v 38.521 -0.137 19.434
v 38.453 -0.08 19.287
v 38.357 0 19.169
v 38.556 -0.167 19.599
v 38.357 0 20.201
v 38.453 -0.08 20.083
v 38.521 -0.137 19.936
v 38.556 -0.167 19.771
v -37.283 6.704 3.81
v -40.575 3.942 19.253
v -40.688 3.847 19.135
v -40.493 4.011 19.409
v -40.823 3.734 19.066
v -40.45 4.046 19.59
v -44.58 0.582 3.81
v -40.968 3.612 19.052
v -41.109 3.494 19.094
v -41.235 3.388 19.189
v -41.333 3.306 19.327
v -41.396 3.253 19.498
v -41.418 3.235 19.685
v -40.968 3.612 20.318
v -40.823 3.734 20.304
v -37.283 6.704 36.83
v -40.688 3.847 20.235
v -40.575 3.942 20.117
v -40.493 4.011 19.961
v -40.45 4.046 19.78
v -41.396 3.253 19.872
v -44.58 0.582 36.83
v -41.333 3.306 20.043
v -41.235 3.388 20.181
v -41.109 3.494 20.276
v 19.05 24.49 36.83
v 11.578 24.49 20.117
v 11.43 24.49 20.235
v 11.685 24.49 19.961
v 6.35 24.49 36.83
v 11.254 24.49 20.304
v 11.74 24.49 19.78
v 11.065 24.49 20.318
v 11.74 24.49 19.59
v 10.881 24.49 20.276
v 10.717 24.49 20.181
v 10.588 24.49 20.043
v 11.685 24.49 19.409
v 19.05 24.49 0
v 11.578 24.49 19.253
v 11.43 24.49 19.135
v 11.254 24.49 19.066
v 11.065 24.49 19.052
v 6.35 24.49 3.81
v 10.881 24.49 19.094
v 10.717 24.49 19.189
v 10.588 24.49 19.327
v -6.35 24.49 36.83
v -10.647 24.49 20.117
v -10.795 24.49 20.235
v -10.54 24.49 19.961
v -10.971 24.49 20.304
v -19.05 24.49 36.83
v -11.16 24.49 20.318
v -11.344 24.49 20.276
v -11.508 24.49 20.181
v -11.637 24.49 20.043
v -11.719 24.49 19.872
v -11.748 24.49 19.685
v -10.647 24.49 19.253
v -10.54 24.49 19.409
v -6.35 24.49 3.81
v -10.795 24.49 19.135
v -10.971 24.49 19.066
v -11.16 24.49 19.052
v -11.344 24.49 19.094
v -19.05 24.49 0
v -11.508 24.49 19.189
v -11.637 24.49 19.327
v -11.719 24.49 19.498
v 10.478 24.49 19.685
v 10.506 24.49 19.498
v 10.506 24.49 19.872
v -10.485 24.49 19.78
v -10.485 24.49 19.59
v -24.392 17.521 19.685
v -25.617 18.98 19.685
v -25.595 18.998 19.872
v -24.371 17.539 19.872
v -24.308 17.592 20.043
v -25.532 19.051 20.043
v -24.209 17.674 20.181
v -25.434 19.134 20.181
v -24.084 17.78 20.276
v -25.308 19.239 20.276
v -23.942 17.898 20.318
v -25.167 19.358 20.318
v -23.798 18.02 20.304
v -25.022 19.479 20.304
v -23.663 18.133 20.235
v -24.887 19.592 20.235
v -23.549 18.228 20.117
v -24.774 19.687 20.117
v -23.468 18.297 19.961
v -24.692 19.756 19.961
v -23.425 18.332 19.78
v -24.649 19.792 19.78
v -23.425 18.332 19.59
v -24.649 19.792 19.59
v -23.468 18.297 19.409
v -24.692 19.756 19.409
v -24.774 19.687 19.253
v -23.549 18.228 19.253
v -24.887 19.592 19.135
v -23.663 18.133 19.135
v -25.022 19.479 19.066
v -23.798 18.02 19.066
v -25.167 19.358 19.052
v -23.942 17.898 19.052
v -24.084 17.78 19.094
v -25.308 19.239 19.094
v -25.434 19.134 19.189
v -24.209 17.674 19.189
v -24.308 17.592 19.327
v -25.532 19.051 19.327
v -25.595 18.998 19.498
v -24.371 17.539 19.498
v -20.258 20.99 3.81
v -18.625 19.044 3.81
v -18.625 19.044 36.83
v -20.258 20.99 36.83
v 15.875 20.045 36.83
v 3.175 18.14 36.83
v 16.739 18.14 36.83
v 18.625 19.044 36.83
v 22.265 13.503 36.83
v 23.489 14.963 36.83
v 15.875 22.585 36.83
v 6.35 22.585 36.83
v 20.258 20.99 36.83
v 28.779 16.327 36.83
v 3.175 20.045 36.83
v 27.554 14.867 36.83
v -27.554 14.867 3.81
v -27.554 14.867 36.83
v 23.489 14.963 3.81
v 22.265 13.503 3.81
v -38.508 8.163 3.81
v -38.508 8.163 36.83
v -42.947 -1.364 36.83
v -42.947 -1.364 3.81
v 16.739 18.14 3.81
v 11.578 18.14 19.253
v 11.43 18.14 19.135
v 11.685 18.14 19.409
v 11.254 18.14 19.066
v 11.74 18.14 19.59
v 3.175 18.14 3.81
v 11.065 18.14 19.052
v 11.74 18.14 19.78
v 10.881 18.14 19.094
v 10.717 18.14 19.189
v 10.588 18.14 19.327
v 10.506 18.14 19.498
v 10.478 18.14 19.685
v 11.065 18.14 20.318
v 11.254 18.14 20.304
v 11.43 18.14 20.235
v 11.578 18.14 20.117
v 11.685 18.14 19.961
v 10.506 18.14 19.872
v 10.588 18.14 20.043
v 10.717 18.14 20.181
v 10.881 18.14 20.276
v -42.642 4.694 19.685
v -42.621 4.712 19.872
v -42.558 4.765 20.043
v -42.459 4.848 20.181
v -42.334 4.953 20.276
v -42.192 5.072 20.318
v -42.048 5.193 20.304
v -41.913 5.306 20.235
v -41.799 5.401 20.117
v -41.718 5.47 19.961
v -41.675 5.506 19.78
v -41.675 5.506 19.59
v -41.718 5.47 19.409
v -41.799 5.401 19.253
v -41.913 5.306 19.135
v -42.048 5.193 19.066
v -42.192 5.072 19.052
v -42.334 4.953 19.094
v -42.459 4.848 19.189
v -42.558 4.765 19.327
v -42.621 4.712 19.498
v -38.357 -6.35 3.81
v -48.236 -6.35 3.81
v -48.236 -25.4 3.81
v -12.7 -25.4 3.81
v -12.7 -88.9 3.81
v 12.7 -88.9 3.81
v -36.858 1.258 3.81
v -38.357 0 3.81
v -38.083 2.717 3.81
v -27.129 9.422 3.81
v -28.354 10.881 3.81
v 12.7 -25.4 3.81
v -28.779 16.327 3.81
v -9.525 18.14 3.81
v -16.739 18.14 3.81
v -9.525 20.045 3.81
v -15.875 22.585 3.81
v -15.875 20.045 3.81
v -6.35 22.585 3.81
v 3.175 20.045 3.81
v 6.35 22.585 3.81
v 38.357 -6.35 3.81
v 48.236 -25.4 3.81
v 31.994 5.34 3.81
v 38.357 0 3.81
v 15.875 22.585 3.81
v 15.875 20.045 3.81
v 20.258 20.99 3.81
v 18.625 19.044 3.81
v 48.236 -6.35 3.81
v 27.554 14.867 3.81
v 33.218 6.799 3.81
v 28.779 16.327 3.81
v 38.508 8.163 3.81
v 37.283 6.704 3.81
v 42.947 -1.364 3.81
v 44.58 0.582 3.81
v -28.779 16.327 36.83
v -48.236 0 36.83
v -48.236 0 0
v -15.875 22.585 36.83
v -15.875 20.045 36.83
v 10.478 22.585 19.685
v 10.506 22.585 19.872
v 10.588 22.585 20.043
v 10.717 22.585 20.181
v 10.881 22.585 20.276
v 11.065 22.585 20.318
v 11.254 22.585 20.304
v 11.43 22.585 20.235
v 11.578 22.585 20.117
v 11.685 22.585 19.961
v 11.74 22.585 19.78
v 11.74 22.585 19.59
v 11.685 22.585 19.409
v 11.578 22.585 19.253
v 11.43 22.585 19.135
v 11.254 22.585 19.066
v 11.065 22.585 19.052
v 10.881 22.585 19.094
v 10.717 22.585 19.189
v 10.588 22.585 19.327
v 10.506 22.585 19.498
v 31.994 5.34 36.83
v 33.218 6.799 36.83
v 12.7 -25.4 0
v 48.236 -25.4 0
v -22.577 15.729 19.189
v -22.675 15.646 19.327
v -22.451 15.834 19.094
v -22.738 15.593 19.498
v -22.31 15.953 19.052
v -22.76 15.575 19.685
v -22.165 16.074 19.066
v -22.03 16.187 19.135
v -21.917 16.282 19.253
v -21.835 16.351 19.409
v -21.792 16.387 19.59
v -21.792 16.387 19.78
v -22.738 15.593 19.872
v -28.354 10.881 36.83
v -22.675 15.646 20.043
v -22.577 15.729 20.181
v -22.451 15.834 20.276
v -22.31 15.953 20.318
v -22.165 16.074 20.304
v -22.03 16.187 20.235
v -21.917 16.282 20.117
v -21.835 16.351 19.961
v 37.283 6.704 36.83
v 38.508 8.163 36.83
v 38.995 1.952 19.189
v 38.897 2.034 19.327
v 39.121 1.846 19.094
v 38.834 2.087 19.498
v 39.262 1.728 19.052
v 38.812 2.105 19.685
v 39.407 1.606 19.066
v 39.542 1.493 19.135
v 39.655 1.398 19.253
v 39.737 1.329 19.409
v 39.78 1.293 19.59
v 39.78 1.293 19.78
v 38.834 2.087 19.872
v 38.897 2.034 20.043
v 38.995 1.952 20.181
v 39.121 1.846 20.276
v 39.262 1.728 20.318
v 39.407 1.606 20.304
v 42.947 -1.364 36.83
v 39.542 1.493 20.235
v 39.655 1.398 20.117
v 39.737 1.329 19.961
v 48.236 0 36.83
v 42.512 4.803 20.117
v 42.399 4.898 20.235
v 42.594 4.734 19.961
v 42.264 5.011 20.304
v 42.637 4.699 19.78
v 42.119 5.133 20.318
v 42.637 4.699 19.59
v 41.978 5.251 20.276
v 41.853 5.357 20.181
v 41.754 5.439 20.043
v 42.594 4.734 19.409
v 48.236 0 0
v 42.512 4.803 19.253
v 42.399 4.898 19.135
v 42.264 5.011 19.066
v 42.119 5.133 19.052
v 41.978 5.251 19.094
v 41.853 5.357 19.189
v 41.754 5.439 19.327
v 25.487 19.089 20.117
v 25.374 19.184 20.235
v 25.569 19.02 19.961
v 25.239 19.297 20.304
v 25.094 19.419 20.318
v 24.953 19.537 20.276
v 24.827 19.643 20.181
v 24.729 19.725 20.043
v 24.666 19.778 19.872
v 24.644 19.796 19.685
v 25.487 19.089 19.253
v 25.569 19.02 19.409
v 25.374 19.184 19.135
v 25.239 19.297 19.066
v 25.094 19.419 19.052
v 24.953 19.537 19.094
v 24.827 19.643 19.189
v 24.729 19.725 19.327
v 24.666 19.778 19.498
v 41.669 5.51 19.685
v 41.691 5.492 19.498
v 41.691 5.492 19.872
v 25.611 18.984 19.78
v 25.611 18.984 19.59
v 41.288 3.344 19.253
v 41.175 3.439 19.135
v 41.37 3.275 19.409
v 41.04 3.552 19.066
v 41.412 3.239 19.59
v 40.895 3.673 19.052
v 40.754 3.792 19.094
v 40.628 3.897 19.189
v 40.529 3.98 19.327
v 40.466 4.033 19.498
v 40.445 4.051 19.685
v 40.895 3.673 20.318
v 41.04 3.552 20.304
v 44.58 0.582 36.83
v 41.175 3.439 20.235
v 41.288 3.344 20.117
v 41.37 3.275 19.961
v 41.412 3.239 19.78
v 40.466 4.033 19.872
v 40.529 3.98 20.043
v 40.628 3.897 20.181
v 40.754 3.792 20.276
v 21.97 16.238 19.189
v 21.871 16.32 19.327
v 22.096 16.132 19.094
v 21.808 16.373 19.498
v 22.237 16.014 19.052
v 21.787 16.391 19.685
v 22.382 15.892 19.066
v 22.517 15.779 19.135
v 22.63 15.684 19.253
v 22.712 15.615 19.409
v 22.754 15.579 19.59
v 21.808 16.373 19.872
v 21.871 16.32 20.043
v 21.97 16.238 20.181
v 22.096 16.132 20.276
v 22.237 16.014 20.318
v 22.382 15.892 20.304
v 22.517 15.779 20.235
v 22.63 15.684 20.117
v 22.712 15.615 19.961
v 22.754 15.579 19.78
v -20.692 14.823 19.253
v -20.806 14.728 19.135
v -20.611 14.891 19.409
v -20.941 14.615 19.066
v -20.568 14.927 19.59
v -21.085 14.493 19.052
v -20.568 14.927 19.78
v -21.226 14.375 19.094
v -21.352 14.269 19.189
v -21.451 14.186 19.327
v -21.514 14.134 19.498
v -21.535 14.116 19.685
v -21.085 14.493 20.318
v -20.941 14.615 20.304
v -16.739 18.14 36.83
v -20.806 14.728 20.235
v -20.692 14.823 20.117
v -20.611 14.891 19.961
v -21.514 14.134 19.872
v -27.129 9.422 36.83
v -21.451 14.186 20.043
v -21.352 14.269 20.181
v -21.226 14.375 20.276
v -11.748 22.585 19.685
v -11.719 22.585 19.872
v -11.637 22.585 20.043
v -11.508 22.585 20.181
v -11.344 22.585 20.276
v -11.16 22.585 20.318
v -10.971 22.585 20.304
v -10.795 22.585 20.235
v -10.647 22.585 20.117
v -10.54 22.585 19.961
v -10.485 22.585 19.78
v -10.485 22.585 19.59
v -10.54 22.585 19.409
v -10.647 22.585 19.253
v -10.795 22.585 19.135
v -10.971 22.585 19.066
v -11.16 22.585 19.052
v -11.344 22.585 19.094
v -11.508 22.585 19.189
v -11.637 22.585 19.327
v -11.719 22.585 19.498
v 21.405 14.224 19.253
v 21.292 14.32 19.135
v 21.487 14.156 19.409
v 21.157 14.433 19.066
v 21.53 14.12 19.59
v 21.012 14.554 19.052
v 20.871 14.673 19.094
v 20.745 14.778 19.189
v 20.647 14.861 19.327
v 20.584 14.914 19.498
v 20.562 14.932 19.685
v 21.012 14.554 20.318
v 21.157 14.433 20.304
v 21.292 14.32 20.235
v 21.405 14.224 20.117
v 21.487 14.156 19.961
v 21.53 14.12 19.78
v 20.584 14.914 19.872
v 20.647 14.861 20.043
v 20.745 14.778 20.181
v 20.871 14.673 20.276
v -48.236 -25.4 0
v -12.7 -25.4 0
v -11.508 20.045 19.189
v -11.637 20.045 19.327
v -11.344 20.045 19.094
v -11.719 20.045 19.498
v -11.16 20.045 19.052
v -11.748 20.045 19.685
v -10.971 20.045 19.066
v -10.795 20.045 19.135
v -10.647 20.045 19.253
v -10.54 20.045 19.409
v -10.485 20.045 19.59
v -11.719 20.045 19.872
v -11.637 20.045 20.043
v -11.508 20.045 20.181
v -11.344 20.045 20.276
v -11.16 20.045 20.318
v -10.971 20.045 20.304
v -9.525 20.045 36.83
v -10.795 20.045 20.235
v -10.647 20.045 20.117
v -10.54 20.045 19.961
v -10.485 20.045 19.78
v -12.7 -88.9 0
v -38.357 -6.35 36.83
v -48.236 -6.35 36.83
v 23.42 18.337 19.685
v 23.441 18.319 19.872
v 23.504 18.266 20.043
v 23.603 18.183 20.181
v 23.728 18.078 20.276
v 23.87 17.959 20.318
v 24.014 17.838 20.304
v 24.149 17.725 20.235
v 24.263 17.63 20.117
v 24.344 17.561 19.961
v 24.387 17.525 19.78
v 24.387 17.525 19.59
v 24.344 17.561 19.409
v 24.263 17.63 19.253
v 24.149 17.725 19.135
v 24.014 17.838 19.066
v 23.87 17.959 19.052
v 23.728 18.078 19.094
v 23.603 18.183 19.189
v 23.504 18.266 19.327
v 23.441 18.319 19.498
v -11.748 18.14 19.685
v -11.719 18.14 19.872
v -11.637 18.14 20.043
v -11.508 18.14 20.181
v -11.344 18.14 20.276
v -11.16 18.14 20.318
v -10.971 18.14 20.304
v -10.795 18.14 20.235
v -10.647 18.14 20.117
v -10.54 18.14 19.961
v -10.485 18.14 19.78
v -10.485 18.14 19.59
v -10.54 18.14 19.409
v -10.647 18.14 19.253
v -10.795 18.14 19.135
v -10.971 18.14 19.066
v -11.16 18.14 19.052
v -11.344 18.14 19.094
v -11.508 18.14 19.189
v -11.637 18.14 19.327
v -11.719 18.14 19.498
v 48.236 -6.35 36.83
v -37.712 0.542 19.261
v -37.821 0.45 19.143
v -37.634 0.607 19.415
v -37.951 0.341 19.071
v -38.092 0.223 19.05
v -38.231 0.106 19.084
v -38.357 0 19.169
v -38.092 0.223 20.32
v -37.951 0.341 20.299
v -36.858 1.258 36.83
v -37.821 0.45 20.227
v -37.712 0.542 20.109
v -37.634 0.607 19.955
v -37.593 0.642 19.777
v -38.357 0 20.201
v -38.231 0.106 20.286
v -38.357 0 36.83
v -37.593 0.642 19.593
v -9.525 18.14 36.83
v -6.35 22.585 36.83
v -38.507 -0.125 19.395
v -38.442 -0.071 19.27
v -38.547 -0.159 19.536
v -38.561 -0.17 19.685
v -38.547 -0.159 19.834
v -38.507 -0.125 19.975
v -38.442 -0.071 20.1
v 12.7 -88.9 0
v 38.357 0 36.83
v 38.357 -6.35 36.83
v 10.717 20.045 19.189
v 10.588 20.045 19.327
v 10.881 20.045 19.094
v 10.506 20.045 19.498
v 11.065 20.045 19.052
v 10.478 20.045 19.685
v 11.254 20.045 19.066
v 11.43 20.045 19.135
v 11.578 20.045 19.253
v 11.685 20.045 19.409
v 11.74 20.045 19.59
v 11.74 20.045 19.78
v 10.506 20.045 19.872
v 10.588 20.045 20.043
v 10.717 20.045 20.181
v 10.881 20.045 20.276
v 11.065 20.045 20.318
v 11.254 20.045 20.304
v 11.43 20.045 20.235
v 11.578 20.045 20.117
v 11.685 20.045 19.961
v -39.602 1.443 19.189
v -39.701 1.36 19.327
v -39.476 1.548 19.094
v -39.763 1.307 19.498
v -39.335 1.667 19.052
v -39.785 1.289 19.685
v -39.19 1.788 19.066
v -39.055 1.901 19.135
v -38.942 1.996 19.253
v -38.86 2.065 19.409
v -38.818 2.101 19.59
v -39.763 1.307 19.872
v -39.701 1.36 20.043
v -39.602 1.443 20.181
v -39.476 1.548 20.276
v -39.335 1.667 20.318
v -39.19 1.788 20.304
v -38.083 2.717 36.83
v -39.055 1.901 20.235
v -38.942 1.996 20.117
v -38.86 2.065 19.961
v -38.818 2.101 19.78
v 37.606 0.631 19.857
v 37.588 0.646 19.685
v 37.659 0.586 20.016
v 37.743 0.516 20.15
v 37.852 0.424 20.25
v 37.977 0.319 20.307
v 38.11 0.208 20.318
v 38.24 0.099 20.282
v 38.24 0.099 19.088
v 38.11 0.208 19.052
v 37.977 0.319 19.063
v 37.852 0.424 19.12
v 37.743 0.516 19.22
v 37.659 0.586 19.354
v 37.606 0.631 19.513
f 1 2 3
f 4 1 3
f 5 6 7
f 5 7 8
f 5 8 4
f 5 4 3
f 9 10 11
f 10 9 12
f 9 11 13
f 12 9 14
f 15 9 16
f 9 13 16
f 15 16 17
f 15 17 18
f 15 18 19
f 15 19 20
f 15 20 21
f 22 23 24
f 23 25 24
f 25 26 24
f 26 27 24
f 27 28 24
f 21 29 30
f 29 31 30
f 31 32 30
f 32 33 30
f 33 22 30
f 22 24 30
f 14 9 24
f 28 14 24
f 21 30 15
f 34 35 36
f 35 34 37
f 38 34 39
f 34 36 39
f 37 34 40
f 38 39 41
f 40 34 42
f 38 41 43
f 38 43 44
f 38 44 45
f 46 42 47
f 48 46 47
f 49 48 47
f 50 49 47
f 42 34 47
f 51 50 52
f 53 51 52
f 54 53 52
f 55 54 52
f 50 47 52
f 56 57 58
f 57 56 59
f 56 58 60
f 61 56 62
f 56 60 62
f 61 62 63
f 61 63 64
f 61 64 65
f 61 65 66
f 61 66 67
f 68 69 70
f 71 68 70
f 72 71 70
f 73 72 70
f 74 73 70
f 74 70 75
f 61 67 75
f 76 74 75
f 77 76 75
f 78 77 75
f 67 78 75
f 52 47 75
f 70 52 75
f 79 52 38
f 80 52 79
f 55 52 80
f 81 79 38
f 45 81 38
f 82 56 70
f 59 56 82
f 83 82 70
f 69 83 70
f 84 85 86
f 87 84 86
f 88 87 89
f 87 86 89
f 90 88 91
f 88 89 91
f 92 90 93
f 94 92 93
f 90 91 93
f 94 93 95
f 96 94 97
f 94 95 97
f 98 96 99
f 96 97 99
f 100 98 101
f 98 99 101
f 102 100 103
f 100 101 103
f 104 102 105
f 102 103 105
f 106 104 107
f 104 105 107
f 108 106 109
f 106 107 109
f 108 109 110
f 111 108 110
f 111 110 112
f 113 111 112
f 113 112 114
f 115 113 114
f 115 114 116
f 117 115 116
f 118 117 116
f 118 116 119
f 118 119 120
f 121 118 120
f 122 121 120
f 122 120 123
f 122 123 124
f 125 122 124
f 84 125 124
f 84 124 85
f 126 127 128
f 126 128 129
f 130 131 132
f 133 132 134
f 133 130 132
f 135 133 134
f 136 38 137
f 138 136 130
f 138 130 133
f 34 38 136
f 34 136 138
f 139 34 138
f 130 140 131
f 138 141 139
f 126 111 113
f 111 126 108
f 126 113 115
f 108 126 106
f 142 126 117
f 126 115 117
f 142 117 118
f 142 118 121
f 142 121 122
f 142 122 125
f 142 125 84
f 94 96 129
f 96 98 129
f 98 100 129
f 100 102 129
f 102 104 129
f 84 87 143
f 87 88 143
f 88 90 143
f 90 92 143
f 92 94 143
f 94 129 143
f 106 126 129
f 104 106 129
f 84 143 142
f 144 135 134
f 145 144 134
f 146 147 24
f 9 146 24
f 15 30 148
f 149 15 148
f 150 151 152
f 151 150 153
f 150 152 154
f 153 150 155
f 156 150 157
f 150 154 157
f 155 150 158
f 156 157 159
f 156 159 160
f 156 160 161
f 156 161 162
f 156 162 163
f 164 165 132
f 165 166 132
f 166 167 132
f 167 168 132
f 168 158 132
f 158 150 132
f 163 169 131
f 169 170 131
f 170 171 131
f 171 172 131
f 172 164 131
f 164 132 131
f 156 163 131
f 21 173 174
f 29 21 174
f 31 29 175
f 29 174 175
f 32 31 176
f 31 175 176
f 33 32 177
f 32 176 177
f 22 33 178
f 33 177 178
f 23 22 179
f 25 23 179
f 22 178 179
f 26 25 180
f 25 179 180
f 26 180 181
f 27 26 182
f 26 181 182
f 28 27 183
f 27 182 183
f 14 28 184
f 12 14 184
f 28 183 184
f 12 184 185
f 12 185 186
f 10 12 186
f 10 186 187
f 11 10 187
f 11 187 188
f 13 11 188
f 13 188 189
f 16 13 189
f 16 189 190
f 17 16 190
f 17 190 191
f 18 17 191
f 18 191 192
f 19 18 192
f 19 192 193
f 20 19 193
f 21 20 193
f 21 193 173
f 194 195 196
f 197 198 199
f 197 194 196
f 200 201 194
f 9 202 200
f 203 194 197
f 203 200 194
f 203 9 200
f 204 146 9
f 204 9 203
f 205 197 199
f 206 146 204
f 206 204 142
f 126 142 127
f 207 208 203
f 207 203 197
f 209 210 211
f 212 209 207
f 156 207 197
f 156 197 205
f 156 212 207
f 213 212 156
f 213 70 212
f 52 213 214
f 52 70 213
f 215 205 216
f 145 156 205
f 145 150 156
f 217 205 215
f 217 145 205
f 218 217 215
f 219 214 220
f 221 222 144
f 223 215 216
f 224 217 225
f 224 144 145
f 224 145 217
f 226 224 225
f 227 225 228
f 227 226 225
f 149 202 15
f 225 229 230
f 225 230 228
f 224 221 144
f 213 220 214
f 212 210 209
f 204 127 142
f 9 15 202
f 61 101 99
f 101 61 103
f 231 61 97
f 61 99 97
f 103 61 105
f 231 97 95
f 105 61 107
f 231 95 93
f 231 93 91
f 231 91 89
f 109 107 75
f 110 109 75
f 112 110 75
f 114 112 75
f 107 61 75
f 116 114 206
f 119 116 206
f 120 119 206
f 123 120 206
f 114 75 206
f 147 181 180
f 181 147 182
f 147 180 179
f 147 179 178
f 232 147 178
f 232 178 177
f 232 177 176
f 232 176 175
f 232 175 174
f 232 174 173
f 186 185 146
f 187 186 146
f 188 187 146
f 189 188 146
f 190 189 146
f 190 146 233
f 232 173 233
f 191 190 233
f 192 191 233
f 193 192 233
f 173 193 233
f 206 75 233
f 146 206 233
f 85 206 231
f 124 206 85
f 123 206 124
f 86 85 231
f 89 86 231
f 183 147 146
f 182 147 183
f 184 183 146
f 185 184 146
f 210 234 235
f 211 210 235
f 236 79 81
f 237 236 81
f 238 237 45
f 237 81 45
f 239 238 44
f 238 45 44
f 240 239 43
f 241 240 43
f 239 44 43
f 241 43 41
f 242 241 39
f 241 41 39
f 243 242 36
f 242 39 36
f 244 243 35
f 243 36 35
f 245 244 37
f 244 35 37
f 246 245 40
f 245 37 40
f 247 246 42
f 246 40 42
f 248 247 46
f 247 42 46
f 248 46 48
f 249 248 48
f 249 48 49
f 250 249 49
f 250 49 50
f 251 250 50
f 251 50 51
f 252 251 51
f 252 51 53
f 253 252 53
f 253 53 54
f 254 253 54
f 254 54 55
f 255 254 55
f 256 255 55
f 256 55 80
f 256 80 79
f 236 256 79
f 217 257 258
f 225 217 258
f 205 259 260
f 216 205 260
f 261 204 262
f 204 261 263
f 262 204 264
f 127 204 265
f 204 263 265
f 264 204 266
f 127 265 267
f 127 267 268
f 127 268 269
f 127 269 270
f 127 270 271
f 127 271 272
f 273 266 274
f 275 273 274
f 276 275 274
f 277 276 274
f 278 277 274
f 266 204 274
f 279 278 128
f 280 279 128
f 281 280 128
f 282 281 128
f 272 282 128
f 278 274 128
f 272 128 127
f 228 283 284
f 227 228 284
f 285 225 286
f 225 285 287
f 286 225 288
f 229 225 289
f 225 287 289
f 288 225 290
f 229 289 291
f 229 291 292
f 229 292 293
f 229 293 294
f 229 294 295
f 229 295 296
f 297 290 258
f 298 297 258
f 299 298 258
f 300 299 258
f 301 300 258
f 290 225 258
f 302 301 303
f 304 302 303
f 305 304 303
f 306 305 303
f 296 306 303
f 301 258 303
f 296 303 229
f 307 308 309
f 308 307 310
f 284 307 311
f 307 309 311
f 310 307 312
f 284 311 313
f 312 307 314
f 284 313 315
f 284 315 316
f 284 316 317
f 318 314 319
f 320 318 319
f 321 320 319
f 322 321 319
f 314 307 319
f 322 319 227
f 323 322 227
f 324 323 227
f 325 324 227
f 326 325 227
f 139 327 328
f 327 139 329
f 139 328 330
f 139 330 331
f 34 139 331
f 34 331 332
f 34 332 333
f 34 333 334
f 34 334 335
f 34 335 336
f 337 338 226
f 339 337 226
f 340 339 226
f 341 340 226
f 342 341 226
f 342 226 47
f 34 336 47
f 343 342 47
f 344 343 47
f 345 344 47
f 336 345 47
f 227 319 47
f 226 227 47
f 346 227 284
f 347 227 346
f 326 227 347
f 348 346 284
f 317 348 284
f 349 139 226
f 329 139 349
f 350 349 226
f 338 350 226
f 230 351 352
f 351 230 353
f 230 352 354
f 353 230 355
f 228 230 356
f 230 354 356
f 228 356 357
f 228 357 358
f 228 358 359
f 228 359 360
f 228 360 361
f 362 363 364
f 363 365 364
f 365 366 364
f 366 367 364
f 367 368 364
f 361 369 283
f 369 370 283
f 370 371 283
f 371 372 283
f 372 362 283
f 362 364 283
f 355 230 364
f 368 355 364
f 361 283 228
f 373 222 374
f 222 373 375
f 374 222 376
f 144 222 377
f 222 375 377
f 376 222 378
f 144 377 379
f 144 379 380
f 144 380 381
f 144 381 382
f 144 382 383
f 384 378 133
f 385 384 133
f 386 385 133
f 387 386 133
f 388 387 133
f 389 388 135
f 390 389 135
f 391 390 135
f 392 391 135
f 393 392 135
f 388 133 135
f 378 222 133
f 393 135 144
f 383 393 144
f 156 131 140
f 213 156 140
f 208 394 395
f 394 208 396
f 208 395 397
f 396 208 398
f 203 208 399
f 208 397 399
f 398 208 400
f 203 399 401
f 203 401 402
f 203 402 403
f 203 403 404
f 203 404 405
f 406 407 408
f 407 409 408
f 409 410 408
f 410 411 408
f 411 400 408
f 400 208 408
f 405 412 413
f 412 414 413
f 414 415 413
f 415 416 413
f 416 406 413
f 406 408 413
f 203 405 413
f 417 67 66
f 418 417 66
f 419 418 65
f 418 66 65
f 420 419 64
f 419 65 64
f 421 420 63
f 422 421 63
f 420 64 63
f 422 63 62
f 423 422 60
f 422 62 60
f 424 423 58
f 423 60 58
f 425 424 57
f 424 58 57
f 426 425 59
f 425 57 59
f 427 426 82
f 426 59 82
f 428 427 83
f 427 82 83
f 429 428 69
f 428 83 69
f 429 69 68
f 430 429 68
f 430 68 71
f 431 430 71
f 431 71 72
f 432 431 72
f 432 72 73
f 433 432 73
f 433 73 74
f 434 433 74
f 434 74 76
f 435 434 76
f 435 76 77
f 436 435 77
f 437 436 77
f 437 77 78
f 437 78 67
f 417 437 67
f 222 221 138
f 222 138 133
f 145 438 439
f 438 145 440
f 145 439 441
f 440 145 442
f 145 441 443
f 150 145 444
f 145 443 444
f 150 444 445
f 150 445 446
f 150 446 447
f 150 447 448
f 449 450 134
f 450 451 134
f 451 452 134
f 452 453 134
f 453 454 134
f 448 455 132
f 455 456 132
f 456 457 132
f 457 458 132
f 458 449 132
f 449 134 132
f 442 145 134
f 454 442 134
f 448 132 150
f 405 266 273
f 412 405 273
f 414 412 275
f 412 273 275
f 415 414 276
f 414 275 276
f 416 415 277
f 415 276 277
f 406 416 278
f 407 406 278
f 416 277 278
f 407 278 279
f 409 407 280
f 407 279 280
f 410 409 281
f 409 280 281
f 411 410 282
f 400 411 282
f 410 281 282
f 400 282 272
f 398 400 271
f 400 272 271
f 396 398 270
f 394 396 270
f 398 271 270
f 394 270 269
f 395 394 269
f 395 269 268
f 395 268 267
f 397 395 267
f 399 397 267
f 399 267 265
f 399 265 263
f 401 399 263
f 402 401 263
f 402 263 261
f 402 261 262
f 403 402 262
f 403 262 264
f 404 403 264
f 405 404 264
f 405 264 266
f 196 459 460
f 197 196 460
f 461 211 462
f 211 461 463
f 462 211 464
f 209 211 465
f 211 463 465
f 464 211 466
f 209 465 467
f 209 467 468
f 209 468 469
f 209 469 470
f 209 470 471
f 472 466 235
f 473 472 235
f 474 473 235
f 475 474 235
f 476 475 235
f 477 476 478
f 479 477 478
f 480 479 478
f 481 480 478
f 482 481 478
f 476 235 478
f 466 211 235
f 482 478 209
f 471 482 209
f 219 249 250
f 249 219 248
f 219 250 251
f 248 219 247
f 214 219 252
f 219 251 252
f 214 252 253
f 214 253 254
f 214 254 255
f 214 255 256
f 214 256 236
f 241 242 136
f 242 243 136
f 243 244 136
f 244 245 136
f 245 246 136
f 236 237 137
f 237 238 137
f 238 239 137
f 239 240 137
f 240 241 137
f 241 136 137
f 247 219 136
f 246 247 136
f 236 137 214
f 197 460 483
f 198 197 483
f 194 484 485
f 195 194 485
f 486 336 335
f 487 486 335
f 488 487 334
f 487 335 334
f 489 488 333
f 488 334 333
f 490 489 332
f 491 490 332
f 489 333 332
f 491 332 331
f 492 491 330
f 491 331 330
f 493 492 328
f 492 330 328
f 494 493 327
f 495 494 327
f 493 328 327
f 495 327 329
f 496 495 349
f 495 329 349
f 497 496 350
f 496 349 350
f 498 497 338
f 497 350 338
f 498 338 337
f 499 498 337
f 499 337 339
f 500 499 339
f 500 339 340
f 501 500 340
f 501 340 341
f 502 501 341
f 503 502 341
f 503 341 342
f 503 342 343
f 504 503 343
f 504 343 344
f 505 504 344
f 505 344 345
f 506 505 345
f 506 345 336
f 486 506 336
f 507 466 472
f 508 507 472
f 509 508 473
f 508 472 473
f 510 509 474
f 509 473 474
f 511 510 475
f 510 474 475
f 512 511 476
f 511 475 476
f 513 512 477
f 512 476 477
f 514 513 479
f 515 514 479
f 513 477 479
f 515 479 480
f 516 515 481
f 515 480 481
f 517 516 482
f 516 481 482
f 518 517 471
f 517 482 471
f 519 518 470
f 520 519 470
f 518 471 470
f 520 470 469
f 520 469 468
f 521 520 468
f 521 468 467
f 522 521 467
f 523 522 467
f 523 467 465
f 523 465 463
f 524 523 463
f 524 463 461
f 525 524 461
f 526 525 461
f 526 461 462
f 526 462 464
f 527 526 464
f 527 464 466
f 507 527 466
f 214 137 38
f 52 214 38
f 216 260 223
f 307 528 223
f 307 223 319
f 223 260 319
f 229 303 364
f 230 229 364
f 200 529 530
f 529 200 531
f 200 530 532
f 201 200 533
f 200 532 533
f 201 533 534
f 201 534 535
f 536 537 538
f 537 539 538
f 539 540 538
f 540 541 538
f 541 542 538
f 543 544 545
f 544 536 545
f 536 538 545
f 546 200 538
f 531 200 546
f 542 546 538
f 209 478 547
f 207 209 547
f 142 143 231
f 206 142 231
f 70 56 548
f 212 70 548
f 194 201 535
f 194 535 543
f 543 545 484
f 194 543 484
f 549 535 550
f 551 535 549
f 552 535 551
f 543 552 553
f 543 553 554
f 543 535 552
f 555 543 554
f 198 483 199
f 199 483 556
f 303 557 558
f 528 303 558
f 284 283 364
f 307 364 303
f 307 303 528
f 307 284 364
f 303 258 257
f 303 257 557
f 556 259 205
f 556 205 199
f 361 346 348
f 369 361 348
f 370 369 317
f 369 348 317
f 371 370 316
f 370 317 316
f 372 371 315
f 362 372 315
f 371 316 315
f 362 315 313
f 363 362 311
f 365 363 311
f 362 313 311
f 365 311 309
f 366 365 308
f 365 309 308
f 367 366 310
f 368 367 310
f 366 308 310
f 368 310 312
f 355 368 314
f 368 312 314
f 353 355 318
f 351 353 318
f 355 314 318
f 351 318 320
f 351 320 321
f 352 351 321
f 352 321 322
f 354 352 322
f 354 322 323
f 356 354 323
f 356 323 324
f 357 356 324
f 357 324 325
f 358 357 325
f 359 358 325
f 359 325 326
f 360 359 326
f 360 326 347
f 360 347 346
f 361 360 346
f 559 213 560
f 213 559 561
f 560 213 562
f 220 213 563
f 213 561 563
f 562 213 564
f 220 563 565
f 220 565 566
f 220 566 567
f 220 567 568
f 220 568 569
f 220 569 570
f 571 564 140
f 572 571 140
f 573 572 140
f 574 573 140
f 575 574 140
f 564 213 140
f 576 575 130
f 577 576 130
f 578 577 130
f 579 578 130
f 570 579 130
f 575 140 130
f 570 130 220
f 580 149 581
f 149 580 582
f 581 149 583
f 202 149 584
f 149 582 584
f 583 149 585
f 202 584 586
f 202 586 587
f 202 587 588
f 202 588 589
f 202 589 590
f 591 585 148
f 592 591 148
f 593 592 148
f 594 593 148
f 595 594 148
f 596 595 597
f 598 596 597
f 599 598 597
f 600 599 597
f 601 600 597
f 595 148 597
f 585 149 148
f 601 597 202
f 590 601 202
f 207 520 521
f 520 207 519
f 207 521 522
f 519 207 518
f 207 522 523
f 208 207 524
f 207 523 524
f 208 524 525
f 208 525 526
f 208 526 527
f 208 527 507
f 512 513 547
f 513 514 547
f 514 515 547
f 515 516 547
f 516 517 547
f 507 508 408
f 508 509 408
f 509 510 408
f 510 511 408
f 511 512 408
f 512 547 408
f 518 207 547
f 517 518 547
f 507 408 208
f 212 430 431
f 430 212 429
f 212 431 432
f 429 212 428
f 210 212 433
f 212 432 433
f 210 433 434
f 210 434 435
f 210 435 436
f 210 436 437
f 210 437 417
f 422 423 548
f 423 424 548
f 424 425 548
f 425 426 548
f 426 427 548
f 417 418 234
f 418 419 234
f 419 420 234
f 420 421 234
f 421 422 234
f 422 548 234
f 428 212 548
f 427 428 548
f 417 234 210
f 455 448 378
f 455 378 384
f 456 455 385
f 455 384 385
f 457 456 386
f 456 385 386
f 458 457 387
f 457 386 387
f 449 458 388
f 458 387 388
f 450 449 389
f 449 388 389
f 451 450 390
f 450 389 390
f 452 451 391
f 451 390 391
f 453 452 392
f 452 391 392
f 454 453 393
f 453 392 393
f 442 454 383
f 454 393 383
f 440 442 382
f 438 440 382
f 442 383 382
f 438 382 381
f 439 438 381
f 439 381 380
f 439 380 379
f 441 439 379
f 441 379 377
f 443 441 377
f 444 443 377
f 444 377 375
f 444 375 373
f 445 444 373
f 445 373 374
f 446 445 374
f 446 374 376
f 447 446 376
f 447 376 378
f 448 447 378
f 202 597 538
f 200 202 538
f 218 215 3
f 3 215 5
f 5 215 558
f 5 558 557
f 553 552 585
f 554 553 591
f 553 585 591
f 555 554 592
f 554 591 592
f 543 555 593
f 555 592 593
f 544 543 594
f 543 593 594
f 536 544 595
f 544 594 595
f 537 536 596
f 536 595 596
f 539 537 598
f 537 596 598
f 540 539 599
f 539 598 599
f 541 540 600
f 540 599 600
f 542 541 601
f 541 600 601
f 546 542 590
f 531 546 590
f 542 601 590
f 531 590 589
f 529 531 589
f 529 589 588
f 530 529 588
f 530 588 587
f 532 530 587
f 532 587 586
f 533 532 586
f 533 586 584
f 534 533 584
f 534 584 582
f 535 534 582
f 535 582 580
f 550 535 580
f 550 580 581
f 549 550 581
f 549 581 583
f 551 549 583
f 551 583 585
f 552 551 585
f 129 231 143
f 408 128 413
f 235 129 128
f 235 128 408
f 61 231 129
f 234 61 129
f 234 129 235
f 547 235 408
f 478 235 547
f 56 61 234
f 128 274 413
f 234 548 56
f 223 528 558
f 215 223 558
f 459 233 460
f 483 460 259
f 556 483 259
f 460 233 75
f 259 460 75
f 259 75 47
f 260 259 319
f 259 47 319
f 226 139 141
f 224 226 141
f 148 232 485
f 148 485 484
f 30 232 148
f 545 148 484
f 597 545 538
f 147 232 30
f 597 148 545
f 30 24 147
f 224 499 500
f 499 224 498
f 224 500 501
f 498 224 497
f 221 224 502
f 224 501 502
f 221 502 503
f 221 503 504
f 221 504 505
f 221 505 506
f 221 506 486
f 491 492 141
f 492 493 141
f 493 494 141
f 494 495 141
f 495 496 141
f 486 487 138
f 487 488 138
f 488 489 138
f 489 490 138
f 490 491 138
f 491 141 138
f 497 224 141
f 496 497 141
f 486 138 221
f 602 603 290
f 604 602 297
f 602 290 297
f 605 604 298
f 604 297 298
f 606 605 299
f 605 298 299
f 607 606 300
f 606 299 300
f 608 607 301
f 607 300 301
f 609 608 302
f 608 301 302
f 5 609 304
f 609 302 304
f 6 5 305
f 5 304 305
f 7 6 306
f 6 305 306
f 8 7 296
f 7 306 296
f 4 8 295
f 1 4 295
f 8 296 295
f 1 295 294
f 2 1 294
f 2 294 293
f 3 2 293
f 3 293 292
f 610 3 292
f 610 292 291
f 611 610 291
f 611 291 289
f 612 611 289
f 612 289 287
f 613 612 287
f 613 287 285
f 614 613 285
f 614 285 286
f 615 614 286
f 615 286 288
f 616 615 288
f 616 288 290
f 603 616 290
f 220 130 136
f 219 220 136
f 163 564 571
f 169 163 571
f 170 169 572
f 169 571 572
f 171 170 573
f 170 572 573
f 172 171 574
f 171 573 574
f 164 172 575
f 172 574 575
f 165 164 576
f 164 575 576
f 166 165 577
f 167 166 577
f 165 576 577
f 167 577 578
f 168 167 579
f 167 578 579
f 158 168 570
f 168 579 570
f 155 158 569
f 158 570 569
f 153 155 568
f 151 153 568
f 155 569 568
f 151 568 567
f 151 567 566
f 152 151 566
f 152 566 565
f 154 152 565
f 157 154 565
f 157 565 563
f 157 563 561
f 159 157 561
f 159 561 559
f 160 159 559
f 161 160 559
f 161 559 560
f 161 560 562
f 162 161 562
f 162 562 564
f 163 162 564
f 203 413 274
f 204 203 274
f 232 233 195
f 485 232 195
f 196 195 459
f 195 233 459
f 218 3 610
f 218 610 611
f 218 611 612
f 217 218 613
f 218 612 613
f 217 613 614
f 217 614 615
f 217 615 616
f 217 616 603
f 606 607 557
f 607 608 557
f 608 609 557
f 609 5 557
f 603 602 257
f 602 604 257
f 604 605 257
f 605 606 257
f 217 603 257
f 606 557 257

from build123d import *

# Parameters (mm, degrees)
F1_DEPTH  = 36.83
F3_DEPTH  = 33.02
F5_DEPTH  = 33.02
F6_R      = 0.635
F7_DEPTH  = 6.35
F9_R      = 0.635
F10_DEPTH = 6.35
F8_R      = 0.635
F11_DEPTH = 6.35
F12_W     = 25.4
F12_H     = 63.5
F13_DEPTH = 3.81


with BuildPart() as f1:
    # F0 (on Top) → F1 (new body)
    with BuildSketch(Plane.XY):
        Polygon((-19.05, 24.4902079291), (-48.2362932828, 0), (-48.2362932828, -25.4), (48.2362932828, -25.4), (48.2362932828, 0), (19.05, 24.4902079291), align=None)
    extrude(amount=F1_DEPTH)

    # F2 (on face) → F3 (cut)
    with BuildSketch(Plane.XY.offset(36.83)):
        Polygon((-16.7387890124, 18.1402079291), (-38.3574469823, 0), (-38.3574469823, -6.35), (-48.2362932828, -6.35), (-48.2362932828, -25.4), (-38.3574469823, -25.4), (38.3574469823, -25.4), (48.2362932828, -25.4), (48.2362932828, -6.35), (38.3574469823, -6.35), (38.3574469823, 0), (16.7387890124, 18.1402079291), align=None)
    extrude(amount=-F3_DEPTH, mode=Mode.SUBTRACT)

    # F4 (on face) → F5 (cut)
    with BuildSketch(Plane.XY.offset(36.83)):
        Polygon((15.875, 22.5852079291), (6.35, 22.5852079291), (6.35, 24.4902079291), (-6.35, 24.4902079291), (-6.35, 22.5852079291), (-15.875, 22.5852079291), (-15.875, 20.0452079291), (-9.525, 20.0452079291), (-9.525, 18.1402079291), (3.175, 18.1402079291), (3.175, 20.0452079291), (15.875, 20.0452079291), align=None)
        Polygon((22.2648719992, 13.503273733), (31.9936364268, 5.33987109), (33.2181468233, 6.7991857541), (42.9469112509, -1.3642168889), (44.5795917795, 0.5815359966), (37.2830184588, 6.7040879789), (38.5075288552, 8.163402643), (28.7787644276, 16.326805286), (27.5542540312, 14.8674906219), (20.2576807104, 20.9900426042), (18.6250001818, 19.0442897186), (23.4893823957, 14.9625883971), align=None)
        Polygon((-42.9469112509, -1.3642168889), (-38.0825290371, 2.7174844326), (-36.8580186406, 1.2581697685), (-27.129254213, 9.4215724115), (-28.3537646095, 10.8808870756), (-18.6250001818, 19.0442897186), (-20.2576807104, 20.9900426042), (-27.5542540312, 14.8674906219), (-28.7787644276, 16.326805286), (-38.5075288552, 8.163402643), (-37.2830184588, 6.7040879789), (-44.5795917795, 0.5815359966), align=None)
    extrude(amount=-F5_DEPTH, mode=Mode.SUBTRACT)

    # F6 (on face) → F7 (cut, through all)
    with BuildSketch(Plane(origin=(-19.9300744284, 23.7517378008, 0), x_dir=(-0.7660444431, -0.6427876097, 0), z_dir=(-0.6427876097, 0.7660444431, 0))):
        with Locations((6.788644426, 19.685)):
            Circle(F6_R)
        with Locations((29.013644426, 19.685)):
            Circle(F6_R)
    extrude(amount=-F7_DEPTH, mode=Mode.SUBTRACT)

    # F9 (on face) → F10 (cut, through all)
    with BuildSketch(Plane(origin=(19.9300744284, 23.7517378008, 0), x_dir=(-0.7660444431, 0.6427876097, 0), z_dir=(0.6427876097, 0.7660444431, 0))):
        with Locations((-29.013644426, 19.685)):
            Circle(F9_R)
        with Locations((-6.788644426, 19.685)):
            Circle(F9_R)
    extrude(amount=-F10_DEPTH, mode=Mode.SUBTRACT)

    # F8 (on face) → F11 (cut, through all)
    with BuildSketch(Plane(origin=(0, 24.4902079291, 0), x_dir=(-1, 0, 0), z_dir=(0, 1, 0))):
        with Locations((-11.1125, 19.685)):
            Circle(F8_R)
        with Locations((11.1125, 19.685)):
            Circle(F8_R)
    extrude(amount=-F11_DEPTH, mode=Mode.SUBTRACT)

    # F12 (on face) → F13 (join, through all)
    with BuildSketch(Plane(origin=(0, 0, 0), x_dir=(1, 0, 0), z_dir=(0, 0, -1))):
        with Locations((0, 57.15)):
            Rectangle(F12_W, F12_H)
    extrude(amount=-F13_DEPTH)


solid = f1.part
